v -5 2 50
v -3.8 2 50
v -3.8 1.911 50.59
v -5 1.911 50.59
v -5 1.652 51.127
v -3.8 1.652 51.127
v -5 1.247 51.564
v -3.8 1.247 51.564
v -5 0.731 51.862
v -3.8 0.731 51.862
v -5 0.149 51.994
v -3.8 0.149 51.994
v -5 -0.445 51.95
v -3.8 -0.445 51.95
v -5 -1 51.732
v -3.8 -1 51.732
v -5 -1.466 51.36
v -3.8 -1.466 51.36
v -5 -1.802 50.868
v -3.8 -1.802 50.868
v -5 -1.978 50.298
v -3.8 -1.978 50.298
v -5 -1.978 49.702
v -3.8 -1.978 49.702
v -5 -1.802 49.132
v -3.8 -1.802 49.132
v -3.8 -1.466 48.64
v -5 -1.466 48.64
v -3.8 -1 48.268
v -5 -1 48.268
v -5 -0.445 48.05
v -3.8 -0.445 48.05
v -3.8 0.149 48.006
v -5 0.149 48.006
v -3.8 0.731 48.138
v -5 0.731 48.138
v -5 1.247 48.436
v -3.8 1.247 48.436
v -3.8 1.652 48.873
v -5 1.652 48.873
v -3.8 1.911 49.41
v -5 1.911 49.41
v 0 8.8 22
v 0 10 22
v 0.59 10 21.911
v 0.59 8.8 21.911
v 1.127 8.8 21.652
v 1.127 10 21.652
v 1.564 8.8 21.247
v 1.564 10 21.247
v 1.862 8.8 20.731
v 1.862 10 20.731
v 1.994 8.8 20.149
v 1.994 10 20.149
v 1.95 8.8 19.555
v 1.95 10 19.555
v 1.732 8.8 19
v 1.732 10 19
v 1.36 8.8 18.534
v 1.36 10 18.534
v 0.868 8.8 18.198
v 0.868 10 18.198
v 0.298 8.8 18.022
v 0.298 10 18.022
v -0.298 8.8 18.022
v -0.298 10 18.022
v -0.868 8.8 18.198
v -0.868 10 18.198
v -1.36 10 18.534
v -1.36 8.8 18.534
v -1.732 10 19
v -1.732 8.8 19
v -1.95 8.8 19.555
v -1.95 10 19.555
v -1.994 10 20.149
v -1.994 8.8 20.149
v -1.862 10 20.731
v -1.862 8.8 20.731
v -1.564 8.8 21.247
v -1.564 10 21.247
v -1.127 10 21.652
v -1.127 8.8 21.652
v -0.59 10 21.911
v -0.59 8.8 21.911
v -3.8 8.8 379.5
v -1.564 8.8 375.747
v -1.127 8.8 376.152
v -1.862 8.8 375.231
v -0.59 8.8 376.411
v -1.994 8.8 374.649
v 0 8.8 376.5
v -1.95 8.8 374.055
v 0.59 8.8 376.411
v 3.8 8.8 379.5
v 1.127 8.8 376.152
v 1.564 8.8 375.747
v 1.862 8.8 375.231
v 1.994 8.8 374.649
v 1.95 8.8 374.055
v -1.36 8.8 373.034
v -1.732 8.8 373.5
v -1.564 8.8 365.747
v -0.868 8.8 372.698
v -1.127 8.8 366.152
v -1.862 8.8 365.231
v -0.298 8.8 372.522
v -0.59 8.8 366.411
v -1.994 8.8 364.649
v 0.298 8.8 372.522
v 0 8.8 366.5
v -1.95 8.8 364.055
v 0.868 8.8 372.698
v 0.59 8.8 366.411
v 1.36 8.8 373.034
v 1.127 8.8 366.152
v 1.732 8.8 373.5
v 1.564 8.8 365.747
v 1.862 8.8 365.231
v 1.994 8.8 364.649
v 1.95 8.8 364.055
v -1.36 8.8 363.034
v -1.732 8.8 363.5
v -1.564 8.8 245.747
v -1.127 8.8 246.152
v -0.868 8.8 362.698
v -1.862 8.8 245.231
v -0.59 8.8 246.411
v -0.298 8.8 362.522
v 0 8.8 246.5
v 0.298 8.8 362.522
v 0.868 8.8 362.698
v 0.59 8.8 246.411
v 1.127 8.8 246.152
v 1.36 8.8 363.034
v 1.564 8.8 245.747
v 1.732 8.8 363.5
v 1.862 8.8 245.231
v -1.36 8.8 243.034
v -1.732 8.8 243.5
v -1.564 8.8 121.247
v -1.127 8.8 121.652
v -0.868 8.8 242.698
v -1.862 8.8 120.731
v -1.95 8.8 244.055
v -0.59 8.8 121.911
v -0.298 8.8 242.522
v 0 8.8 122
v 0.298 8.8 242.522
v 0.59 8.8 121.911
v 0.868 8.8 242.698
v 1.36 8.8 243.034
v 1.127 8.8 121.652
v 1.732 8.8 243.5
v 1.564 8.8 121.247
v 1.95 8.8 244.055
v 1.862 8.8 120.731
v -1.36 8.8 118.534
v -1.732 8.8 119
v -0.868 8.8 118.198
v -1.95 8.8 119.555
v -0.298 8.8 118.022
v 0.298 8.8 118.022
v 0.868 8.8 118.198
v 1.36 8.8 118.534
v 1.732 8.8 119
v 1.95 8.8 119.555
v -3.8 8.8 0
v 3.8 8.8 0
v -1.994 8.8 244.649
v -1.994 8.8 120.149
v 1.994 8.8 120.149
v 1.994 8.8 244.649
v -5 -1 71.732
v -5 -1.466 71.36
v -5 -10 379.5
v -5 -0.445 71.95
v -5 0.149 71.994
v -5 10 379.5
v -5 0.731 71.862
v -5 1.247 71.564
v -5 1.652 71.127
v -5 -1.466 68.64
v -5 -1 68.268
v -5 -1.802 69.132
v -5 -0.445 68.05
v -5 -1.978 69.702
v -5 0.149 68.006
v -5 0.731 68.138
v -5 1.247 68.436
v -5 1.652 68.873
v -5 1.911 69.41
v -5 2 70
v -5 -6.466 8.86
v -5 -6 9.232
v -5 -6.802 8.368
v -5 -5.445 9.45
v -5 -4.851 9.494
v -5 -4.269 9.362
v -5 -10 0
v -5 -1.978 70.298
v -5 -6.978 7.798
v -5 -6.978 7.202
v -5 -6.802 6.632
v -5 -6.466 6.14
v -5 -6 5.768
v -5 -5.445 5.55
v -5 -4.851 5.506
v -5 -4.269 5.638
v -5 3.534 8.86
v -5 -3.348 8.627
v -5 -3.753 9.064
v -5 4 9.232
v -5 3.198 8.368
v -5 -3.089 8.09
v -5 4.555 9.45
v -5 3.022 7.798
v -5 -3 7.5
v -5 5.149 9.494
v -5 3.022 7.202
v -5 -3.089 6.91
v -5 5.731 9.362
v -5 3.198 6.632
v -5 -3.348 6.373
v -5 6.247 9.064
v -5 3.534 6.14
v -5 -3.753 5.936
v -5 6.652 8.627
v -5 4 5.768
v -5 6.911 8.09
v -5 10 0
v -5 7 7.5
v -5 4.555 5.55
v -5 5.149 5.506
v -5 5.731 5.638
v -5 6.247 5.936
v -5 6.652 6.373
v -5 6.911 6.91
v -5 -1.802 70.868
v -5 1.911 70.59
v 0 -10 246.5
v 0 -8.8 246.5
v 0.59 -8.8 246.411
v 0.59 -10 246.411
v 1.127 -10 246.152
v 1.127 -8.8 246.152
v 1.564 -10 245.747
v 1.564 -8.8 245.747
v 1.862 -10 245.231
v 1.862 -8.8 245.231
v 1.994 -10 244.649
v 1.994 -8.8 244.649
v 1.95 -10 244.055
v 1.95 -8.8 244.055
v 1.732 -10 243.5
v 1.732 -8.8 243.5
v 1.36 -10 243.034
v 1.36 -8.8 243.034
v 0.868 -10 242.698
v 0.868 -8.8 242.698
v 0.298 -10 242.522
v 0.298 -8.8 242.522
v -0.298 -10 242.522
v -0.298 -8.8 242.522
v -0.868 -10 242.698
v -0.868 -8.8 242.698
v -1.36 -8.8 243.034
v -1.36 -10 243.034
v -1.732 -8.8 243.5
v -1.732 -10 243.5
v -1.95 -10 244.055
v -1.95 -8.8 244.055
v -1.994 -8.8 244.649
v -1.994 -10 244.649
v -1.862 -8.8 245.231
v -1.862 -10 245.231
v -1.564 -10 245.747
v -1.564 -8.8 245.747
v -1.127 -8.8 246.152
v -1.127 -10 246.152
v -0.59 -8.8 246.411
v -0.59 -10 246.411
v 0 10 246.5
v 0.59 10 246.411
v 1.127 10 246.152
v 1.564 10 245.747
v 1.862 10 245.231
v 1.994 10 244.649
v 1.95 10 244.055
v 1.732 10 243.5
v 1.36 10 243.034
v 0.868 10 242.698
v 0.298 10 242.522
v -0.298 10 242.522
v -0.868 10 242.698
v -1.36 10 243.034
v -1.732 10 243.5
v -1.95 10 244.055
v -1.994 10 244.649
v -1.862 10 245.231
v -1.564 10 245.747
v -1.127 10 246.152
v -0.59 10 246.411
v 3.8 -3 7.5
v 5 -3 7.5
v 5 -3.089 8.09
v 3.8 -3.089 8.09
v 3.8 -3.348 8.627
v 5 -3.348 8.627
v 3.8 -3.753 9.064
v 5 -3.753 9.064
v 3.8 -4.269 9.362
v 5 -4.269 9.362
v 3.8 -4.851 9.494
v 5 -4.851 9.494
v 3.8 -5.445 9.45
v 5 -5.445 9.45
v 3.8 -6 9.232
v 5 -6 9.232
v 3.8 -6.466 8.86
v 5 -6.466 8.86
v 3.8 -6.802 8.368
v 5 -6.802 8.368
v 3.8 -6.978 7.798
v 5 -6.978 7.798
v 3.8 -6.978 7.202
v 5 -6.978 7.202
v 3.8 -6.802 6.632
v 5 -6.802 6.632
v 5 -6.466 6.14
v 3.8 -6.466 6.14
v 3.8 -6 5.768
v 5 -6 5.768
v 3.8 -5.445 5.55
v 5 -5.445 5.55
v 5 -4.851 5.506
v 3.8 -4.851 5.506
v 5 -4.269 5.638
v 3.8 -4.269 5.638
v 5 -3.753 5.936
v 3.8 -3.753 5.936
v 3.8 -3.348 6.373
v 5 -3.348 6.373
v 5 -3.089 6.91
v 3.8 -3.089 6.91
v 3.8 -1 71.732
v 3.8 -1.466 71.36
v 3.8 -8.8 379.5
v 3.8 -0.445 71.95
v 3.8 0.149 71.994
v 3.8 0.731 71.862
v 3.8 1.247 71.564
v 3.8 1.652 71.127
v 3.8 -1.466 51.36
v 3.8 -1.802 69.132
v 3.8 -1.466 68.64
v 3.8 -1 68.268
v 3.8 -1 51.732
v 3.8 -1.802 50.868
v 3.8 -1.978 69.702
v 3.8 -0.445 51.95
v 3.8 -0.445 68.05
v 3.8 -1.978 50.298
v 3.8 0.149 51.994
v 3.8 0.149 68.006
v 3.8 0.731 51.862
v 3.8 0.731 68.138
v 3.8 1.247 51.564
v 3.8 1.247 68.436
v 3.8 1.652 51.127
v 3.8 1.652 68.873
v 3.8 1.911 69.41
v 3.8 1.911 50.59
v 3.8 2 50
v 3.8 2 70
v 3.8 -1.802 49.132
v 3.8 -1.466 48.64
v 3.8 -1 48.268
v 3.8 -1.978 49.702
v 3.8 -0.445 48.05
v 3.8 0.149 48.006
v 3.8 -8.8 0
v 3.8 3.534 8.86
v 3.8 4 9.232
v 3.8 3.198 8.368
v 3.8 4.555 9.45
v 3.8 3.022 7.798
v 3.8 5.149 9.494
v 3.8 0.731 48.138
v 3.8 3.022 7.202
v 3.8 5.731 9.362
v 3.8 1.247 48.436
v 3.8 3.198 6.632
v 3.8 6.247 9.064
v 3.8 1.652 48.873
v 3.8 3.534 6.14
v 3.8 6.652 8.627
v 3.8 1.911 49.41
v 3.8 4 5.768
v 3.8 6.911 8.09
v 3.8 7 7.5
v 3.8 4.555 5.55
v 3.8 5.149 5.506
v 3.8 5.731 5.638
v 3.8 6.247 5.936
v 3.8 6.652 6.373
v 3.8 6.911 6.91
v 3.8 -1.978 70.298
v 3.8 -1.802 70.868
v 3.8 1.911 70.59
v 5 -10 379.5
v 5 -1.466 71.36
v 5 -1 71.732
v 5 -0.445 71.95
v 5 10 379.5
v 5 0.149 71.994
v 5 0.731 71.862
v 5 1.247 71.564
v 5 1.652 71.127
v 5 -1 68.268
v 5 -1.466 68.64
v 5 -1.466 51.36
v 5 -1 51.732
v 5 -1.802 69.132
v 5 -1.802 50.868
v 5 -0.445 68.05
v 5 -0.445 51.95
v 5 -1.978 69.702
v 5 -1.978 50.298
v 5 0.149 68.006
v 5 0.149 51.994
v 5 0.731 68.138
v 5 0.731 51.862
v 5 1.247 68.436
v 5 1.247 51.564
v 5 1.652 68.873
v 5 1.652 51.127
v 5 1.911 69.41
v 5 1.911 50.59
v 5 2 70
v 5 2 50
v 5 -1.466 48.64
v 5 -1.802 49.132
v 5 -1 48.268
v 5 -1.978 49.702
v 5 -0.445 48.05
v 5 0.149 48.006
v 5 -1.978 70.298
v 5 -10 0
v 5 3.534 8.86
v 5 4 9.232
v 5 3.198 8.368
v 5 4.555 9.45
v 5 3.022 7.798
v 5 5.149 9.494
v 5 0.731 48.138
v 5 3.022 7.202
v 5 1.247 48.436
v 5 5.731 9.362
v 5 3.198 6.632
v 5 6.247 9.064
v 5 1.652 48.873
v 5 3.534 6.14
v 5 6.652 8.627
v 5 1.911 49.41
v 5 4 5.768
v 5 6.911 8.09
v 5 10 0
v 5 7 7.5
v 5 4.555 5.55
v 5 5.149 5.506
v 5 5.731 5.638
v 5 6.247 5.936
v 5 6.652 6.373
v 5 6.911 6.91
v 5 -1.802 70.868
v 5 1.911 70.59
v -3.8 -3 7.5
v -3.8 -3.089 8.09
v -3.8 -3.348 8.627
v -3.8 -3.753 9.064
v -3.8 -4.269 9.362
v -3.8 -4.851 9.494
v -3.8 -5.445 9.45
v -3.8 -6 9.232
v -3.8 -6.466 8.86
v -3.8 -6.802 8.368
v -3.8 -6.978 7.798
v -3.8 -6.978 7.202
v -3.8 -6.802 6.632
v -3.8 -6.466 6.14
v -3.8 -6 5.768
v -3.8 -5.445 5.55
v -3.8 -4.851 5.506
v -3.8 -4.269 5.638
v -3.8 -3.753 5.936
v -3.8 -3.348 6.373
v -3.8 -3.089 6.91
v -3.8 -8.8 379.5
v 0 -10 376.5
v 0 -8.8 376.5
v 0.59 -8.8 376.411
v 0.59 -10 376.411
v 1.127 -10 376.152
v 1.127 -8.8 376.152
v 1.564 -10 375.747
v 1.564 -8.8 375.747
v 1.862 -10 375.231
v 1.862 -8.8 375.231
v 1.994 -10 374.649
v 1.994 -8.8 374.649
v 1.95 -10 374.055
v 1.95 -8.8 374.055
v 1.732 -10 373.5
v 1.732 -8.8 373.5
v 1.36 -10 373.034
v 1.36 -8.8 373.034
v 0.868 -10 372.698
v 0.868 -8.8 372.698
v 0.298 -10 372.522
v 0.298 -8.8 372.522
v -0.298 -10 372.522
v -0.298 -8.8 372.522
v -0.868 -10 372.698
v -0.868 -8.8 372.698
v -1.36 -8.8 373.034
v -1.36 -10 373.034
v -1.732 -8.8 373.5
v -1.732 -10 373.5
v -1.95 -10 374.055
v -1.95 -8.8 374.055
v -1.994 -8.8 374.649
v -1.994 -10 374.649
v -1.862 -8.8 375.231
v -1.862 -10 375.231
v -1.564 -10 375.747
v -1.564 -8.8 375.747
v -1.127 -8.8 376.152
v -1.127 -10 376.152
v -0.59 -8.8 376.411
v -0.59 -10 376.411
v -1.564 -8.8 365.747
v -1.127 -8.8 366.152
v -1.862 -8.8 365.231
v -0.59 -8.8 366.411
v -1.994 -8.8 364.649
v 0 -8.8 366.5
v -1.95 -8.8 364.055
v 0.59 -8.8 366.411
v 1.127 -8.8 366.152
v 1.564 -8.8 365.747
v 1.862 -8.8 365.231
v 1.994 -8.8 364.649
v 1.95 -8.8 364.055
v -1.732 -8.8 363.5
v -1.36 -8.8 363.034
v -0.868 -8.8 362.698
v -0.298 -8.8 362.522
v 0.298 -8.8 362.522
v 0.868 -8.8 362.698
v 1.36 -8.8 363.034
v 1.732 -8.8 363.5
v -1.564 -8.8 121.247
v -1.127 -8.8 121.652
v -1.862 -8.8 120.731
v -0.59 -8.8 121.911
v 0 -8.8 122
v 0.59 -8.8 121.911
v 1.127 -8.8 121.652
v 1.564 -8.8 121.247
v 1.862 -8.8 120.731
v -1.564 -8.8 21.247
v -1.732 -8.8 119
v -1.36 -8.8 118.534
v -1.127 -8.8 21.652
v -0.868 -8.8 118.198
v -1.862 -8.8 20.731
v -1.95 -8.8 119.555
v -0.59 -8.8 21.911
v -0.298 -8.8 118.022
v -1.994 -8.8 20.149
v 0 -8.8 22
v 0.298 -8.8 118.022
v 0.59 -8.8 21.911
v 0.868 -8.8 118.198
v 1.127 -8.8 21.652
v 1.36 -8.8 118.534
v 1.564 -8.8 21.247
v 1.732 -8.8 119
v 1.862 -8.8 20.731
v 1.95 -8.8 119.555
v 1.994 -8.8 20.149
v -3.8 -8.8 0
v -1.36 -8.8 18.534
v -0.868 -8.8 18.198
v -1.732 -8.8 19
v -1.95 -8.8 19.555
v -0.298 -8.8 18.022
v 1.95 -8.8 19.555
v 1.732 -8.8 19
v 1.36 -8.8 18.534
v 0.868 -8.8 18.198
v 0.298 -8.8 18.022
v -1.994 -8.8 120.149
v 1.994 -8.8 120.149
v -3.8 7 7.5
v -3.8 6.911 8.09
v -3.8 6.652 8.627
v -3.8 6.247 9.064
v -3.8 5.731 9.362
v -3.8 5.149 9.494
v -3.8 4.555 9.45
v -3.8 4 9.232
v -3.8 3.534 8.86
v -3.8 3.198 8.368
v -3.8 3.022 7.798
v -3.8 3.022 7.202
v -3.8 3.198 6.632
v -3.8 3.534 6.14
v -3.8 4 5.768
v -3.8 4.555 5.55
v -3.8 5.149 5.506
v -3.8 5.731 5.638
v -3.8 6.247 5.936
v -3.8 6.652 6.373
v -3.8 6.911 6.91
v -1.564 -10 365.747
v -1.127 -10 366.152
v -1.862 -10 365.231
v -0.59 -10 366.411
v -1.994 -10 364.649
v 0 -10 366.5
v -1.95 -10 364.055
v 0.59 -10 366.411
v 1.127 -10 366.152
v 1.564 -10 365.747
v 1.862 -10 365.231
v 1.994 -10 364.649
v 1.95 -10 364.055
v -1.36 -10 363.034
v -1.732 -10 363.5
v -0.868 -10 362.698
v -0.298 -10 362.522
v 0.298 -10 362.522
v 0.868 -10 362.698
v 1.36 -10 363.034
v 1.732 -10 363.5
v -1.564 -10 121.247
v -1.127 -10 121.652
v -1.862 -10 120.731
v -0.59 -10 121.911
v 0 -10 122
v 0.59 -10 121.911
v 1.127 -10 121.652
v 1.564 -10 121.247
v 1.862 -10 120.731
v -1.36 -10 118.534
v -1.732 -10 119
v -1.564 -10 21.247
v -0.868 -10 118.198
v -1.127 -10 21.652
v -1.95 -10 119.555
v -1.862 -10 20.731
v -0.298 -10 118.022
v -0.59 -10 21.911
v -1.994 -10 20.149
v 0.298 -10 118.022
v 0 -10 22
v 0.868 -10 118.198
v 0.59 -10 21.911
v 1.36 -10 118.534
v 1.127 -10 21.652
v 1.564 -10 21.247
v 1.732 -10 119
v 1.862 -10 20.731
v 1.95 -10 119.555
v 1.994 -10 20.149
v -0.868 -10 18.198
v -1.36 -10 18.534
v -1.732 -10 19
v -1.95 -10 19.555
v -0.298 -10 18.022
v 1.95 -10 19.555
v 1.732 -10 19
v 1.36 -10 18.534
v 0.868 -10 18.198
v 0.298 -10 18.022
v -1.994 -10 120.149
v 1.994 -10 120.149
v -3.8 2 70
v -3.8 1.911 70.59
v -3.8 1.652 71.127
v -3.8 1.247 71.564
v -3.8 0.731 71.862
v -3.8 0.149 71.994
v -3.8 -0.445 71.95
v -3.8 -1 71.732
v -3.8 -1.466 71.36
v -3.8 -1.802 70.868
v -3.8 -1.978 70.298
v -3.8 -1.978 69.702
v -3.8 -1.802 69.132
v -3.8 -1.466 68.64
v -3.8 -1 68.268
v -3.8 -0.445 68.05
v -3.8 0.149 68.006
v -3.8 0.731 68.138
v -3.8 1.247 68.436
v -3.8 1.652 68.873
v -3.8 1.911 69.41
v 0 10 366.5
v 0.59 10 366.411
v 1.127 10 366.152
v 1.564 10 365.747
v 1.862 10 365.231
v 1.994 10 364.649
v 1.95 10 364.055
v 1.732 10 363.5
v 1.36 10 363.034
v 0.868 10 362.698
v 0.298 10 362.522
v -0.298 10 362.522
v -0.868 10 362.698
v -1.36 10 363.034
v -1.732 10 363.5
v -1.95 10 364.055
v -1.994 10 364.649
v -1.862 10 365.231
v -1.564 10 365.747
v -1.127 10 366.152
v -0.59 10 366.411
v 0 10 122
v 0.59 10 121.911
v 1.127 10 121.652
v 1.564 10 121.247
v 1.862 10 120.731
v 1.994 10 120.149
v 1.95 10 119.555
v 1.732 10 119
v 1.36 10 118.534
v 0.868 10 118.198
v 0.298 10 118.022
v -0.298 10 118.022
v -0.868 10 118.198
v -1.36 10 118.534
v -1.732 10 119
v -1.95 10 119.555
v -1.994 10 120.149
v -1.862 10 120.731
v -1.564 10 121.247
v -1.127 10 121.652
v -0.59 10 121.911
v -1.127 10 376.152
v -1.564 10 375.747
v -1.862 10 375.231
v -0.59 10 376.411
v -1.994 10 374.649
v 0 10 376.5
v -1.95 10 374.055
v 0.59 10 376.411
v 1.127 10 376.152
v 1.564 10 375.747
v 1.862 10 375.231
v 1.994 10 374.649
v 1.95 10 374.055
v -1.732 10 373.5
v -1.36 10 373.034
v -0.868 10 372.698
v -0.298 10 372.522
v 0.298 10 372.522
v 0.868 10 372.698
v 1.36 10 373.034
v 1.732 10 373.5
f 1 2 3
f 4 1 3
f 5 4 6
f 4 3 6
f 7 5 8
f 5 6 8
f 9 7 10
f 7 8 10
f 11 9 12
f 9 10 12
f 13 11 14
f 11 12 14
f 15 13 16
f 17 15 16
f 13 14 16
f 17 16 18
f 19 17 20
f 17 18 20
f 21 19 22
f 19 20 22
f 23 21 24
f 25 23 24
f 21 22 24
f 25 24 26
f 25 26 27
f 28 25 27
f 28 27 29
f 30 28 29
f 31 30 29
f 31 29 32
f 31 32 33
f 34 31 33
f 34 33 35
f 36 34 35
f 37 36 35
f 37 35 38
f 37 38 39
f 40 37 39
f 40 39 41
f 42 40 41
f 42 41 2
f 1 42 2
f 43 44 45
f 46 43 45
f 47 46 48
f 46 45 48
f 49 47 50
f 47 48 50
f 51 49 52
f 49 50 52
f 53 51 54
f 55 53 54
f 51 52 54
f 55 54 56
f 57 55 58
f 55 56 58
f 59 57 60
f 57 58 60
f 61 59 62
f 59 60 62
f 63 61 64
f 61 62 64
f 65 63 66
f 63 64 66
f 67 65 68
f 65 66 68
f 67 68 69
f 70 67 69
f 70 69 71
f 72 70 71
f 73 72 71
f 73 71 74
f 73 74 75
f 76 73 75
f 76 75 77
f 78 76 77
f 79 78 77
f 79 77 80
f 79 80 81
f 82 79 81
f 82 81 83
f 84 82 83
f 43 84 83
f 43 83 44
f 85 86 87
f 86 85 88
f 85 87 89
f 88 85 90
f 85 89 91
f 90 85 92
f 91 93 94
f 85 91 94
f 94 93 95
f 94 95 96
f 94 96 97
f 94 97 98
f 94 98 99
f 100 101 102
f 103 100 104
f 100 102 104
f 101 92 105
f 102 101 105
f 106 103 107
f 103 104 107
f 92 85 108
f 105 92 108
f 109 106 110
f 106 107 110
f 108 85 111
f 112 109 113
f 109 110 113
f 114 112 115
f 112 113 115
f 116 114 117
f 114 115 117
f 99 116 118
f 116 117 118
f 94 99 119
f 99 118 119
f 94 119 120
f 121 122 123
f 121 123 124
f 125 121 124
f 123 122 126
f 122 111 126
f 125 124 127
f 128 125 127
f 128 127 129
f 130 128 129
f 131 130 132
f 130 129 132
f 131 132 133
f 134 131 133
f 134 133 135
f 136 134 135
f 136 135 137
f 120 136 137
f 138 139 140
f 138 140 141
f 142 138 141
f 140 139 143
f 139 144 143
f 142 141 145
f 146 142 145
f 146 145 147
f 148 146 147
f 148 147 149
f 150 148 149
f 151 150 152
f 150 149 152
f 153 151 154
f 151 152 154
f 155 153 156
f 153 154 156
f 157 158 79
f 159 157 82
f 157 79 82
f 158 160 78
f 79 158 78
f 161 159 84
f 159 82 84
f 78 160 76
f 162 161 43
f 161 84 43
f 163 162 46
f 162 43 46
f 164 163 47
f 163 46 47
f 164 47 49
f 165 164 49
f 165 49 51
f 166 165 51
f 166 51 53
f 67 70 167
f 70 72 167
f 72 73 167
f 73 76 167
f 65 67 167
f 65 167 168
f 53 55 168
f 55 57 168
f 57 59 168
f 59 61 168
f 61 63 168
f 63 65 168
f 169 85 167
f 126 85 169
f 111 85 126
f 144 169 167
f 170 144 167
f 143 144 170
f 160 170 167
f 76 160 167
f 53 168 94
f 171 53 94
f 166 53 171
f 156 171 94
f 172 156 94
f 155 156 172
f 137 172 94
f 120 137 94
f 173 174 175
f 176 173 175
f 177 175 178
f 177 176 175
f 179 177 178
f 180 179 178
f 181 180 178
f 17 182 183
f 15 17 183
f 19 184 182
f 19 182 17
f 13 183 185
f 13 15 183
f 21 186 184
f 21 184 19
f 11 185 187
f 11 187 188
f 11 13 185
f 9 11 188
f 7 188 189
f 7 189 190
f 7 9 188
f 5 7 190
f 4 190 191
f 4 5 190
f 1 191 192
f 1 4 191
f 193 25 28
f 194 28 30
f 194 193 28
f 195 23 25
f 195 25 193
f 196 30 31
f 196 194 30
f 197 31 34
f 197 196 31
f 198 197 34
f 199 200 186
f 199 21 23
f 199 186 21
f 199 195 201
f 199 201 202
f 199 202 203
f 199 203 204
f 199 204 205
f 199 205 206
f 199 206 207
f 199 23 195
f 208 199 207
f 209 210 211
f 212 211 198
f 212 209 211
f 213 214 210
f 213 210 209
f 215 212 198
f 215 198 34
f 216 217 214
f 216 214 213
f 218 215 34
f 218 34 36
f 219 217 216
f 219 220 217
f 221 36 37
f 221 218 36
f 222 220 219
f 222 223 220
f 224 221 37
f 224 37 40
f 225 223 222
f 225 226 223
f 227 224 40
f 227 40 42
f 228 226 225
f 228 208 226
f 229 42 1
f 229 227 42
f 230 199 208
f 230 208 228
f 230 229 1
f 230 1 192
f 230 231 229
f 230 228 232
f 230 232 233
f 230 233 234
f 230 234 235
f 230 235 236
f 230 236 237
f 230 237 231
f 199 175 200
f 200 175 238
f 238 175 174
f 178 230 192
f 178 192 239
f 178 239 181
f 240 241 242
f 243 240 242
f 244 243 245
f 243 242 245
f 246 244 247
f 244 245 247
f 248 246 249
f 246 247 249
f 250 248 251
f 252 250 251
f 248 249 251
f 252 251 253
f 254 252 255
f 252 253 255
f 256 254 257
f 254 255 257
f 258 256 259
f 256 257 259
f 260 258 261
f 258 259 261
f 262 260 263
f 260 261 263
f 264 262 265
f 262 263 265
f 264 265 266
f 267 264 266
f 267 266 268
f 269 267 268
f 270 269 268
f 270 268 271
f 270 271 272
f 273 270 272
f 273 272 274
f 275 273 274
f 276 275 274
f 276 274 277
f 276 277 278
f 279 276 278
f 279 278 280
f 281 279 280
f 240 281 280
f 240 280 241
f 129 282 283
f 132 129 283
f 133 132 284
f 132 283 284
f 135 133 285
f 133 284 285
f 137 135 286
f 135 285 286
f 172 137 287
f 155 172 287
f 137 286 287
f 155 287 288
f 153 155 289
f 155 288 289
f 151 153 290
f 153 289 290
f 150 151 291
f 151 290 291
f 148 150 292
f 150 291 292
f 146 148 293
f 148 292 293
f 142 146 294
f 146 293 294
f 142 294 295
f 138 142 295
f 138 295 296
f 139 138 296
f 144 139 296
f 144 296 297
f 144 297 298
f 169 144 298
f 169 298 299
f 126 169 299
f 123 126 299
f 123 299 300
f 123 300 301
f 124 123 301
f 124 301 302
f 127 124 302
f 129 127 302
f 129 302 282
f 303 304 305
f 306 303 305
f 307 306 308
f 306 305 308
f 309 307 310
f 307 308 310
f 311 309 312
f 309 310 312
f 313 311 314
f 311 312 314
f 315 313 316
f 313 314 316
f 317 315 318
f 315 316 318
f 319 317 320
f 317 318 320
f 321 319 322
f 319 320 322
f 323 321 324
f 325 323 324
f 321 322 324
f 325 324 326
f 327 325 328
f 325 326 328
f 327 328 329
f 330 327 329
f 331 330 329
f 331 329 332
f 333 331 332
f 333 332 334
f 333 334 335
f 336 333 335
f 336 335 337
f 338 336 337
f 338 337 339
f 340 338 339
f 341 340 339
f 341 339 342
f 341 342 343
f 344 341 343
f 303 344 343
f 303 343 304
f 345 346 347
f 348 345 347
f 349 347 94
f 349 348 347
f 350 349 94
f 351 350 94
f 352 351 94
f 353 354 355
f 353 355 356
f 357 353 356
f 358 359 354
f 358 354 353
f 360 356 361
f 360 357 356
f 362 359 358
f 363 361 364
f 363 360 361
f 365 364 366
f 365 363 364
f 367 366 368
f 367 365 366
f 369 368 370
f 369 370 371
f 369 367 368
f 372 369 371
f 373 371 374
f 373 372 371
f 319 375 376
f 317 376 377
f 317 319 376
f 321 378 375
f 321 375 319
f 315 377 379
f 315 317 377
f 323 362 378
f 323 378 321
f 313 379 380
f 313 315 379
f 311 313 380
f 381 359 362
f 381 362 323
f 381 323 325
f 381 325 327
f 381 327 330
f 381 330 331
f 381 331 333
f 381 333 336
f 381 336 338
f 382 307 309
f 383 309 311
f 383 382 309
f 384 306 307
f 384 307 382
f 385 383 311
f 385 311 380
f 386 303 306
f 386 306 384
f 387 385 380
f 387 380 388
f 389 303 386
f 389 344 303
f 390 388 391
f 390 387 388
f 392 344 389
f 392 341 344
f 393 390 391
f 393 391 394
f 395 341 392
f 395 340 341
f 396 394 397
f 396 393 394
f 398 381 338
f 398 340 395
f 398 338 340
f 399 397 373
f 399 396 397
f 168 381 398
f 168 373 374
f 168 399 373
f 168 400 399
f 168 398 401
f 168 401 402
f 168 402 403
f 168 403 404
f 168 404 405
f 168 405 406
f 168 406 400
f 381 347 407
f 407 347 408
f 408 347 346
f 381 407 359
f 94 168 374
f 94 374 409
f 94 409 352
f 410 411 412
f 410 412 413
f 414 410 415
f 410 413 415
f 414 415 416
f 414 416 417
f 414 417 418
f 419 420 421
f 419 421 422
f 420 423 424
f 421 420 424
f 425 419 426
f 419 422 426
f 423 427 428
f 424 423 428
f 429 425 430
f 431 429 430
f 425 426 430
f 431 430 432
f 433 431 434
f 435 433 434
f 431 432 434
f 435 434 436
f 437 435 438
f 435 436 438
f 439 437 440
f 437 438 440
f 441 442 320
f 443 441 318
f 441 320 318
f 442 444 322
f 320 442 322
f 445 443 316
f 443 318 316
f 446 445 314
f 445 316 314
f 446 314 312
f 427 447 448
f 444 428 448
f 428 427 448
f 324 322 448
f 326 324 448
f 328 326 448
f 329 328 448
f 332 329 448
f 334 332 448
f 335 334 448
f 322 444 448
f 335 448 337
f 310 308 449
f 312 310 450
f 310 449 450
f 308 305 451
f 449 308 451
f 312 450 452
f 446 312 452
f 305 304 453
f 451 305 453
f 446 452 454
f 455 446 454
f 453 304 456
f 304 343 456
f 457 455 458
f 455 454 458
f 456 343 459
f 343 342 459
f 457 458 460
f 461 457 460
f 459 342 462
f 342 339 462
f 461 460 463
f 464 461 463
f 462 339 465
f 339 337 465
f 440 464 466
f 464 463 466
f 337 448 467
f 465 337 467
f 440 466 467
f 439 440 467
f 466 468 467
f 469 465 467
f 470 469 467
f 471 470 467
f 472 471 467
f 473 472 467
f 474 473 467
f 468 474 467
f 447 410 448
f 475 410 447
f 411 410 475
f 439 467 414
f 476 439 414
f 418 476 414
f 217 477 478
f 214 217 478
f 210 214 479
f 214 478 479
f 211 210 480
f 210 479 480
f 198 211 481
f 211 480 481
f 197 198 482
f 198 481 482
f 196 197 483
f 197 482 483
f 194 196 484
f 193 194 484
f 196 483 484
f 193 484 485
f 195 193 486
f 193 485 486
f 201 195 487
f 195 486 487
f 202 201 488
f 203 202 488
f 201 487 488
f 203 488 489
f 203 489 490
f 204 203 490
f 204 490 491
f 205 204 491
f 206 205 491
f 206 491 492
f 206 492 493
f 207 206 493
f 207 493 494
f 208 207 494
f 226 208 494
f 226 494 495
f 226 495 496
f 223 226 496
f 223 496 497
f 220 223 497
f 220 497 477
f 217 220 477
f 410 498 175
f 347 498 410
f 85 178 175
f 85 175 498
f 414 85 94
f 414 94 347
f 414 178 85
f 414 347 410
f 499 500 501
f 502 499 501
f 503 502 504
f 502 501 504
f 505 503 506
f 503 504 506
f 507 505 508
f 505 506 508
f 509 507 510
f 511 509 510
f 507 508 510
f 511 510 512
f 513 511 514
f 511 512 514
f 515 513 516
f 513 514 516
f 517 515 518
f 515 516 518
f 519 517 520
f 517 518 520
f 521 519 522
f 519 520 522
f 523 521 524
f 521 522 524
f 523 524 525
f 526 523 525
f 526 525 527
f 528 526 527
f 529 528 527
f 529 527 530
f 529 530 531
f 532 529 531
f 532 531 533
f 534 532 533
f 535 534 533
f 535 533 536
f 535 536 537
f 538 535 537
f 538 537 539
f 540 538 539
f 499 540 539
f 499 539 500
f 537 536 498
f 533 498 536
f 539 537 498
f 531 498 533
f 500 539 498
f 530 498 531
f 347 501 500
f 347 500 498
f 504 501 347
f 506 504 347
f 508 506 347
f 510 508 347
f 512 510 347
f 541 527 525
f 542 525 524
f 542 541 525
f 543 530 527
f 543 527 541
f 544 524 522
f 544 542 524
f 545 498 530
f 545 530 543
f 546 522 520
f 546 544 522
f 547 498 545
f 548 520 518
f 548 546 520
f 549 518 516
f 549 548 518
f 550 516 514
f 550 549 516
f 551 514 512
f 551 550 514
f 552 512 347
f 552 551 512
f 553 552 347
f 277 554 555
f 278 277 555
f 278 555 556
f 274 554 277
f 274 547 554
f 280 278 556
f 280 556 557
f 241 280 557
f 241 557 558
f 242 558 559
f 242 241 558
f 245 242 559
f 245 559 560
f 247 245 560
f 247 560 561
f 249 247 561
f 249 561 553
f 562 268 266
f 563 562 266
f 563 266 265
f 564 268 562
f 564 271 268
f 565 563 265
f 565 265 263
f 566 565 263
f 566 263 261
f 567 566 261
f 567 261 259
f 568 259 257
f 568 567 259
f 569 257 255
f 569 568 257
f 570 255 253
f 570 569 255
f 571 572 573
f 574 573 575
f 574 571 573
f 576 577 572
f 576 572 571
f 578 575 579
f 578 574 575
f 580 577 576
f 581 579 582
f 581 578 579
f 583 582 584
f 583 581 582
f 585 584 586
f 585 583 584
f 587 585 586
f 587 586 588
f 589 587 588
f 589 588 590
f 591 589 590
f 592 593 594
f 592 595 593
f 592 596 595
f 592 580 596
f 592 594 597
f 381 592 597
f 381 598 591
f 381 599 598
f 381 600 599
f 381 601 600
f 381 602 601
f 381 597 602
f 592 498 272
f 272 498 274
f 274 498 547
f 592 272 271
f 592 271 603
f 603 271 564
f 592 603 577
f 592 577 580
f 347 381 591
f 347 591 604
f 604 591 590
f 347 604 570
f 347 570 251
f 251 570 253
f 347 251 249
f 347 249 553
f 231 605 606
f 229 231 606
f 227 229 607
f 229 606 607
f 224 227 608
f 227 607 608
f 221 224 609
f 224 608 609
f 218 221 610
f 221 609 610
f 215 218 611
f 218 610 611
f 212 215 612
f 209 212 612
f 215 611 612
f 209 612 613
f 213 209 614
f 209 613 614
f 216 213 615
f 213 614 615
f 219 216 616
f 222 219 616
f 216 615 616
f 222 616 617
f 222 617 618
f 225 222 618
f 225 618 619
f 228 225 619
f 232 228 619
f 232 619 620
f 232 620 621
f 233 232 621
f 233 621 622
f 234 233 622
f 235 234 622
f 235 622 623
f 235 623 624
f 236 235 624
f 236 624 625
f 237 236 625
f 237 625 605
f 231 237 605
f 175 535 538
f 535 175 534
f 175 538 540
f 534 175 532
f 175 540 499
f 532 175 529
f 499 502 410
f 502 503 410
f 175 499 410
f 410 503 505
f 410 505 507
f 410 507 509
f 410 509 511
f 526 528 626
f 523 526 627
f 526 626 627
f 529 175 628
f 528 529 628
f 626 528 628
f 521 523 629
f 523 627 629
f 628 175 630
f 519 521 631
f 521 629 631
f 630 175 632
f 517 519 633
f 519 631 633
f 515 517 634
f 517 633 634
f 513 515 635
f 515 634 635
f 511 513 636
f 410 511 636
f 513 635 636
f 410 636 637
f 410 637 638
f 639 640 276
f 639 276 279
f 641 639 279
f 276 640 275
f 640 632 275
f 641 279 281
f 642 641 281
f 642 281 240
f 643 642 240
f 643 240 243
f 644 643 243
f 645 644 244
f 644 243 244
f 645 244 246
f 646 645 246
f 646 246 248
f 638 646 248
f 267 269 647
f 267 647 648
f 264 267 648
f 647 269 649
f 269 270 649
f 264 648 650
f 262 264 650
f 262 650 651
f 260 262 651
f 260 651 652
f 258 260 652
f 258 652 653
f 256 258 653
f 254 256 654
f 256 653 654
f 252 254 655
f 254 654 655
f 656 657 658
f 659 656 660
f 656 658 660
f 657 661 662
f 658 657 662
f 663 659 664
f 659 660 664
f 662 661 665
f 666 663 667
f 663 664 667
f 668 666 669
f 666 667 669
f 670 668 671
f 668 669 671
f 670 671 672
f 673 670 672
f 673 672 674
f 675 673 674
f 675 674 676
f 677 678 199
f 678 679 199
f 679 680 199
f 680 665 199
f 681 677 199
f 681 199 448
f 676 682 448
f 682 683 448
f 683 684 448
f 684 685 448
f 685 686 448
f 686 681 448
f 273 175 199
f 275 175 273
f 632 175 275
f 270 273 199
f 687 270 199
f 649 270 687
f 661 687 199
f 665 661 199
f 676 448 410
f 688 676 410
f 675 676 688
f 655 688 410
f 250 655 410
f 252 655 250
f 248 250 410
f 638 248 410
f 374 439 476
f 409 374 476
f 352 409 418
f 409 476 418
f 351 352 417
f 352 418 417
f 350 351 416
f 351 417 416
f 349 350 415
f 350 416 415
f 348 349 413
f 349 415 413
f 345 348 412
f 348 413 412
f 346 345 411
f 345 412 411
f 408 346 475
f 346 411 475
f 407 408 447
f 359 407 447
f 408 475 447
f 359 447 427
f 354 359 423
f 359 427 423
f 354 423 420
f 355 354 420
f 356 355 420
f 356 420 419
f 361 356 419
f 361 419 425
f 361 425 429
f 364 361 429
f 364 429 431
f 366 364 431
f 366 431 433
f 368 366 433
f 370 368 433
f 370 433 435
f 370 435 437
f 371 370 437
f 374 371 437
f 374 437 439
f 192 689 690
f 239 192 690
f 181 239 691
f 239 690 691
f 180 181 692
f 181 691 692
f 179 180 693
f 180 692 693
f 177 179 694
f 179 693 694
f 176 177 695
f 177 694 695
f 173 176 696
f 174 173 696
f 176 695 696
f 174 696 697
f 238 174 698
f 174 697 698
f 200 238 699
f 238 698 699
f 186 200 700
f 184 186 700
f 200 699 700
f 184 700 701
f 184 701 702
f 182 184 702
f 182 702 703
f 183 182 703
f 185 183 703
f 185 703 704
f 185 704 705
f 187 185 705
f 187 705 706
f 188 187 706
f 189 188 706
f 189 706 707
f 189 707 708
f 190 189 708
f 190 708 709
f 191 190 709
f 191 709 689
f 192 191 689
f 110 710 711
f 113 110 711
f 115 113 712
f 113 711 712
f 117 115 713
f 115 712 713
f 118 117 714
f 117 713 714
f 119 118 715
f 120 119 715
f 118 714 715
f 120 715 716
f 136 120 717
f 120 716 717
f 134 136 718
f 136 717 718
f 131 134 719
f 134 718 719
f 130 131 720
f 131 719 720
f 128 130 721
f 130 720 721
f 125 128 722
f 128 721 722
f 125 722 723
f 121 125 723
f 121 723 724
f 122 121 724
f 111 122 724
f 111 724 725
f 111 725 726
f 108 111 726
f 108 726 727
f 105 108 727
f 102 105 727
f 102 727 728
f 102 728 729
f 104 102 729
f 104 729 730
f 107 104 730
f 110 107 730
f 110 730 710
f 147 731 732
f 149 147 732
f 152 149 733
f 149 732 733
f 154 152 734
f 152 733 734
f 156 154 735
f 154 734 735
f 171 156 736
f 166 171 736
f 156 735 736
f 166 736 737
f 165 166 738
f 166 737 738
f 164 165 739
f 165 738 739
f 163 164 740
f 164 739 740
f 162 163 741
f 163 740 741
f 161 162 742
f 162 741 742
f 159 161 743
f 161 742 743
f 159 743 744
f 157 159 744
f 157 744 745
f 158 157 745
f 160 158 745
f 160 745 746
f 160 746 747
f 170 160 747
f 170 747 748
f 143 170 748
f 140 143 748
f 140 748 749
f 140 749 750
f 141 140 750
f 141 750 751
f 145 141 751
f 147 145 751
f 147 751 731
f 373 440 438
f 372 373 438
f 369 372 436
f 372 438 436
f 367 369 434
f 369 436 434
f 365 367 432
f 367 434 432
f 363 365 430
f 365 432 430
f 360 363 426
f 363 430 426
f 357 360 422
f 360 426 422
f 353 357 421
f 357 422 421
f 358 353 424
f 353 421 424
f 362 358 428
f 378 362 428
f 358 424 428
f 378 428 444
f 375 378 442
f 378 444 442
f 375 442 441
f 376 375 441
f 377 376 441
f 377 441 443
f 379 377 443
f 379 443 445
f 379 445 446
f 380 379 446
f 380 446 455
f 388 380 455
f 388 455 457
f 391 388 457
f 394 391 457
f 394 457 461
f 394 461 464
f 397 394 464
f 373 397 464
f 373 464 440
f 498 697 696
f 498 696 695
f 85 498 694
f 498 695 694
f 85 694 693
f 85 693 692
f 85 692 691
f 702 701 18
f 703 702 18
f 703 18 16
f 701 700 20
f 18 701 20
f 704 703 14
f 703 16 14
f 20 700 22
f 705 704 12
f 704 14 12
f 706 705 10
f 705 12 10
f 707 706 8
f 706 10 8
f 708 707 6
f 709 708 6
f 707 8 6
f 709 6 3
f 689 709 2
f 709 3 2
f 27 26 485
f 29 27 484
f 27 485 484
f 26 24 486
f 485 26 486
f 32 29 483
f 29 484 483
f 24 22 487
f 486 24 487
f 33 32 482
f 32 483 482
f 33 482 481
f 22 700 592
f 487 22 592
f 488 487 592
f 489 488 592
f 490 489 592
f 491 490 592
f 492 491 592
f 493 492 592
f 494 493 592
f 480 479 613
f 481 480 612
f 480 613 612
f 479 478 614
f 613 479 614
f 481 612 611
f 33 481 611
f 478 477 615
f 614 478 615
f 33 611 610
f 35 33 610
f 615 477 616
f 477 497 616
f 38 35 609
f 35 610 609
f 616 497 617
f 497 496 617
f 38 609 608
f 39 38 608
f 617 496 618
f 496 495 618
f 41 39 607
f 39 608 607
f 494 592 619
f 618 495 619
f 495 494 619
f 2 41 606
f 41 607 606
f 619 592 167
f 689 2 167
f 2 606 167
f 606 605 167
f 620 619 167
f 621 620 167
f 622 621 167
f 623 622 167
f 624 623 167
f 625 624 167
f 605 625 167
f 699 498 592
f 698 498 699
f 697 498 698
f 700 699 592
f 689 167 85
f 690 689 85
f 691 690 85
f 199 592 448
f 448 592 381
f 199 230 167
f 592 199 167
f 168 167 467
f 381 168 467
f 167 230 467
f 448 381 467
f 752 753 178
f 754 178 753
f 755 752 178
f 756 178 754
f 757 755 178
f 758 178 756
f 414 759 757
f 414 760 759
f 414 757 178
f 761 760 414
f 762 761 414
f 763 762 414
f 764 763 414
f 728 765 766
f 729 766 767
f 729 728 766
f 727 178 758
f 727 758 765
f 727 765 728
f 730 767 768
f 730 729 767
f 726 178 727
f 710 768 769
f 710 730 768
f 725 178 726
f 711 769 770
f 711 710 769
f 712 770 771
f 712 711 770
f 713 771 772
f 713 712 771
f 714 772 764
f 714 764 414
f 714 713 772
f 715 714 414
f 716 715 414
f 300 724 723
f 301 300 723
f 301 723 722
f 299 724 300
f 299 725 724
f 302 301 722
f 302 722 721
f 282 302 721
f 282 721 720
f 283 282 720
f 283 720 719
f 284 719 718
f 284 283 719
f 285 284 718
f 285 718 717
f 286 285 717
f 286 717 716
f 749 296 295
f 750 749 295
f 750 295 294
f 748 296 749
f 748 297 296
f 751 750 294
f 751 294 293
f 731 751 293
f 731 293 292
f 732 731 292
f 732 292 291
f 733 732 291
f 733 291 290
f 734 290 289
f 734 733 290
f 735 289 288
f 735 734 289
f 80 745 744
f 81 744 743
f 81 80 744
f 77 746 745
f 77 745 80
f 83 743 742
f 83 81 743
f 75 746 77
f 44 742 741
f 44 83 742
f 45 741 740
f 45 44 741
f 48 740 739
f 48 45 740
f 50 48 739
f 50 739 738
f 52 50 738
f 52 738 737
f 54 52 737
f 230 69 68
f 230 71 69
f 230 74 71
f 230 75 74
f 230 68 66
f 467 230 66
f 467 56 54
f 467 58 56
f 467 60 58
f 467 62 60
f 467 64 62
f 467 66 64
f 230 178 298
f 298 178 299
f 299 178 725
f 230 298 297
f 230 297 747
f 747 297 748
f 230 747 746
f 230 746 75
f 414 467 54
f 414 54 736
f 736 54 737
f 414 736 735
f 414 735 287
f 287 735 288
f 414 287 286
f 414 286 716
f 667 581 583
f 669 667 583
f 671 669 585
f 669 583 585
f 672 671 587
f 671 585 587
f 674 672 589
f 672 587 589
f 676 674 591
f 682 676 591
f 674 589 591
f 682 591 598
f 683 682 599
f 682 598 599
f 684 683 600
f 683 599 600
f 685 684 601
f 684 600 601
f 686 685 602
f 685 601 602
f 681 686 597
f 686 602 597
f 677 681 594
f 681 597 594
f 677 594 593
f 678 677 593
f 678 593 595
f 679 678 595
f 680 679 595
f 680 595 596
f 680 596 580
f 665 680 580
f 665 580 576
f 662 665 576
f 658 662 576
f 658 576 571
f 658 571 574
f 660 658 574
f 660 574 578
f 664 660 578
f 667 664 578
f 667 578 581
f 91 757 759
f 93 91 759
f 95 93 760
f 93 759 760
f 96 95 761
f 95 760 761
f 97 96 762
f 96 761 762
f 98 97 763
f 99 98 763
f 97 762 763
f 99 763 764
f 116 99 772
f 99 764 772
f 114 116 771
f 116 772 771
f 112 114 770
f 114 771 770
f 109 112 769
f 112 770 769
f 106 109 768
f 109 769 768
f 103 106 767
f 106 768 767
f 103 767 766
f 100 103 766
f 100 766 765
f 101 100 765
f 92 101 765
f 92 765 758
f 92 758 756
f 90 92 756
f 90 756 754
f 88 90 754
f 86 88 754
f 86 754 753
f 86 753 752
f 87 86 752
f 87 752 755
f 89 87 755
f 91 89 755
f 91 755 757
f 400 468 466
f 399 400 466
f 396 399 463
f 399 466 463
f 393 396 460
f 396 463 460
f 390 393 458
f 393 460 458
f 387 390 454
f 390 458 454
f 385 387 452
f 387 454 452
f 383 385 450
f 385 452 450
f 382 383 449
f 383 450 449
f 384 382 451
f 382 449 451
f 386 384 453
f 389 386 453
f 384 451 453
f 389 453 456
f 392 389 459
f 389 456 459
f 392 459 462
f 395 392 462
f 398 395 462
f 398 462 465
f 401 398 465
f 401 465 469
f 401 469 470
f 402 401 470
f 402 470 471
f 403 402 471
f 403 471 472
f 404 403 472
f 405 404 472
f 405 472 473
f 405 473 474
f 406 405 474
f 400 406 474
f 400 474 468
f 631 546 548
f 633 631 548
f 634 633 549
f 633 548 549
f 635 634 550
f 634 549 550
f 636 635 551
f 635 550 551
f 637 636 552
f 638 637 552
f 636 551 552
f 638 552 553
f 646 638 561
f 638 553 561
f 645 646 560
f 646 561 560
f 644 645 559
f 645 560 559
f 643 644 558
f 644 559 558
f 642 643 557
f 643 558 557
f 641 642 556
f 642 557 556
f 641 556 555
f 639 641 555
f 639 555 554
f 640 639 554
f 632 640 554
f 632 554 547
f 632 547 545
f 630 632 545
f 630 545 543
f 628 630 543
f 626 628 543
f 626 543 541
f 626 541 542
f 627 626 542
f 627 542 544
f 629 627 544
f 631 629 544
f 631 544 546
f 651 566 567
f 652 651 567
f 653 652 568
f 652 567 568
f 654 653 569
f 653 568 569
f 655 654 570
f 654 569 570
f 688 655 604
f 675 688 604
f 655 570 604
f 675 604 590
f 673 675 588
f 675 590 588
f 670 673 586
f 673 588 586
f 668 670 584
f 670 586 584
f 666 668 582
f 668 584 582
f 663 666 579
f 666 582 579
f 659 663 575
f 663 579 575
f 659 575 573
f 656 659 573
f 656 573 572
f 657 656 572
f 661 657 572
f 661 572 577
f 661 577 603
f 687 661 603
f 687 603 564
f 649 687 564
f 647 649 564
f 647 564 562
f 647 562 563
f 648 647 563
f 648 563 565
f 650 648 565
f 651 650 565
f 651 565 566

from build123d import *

# Parameters (mm, degrees)
SKETCH_1_W          = 10
SKETCH_1_H          = 20
SKETCH_1_W_2        = 7.6
SKETCH_1_H_2        = 17.6
EXTRUDE_1_DEPTH     = 379.5
SKETCH_2_R          = 2
CUT_EXTRUDE_1_DEPTH = 381.05953481
SKETCH_3_R          = 2
CUT_EXTRUDE_2_DEPTH = 380.763413193


with BuildPart() as part:
    # ｽｹｯﾁ1 → 押し出し-薄板1 (new body)
    with BuildSketch(Plane.XY):
        Rectangle(SKETCH_1_W, SKETCH_1_H)
        Rectangle(SKETCH_1_W_2, SKETCH_1_H_2, mode=Mode.SUBTRACT)
    extrude(amount=EXTRUDE_1_DEPTH)

    # ｽｹｯﾁ2 → ｶｯﾄ - 押し出し1 (cut, through all)
    with BuildSketch(Plane(origin=(0, 10, 0), x_dir=(1, 0, 0), z_dir=(0, 1, 0))):
        with Locations(Location((0, -364.5, 0), (0, 0, 270))):
            Circle(SKETCH_2_R)
        with Locations(Location((0, -374.5, 0), (0, 0, 270))):
            Circle(SKETCH_2_R)
        with Locations(Location((0, -244.5, 0), (0, 0, 270))):
            Circle(SKETCH_2_R)
        with Locations(Location((0, -120, 0), (0, 0, 270))):
            Circle(SKETCH_2_R)
        with Locations(Location((0, -20, 0), (0, 0, 270))):
            Circle(SKETCH_2_R)
    extrude(amount=-CUT_EXTRUDE_1_DEPTH, mode=Mode.SUBTRACT)

    # ｽｹｯﾁ3 → ｶｯﾄ - 押し出し2 (cut, through all)
    with BuildSketch(Plane(origin=(5, 0, 0), x_dir=(0, 0, -1), z_dir=(1, 0, 0))):
        with Locations(Location((-7.5, 5, 0), (0, 0, 90))):
            Circle(SKETCH_3_R)
        with Locations(Location((-7.5, -5, 0), (0, 0, 90))):
            Circle(SKETCH_3_R)
        with Locations(Location((-70, 0, 0), (0, 0, 90))):
            Circle(SKETCH_3_R)
        with Locations(Location((-50, 0, 0), (0, 0, 90))):
            Circle(SKETCH_3_R)
    extrude(amount=-CUT_EXTRUDE_2_DEPTH, mode=Mode.SUBTRACT)


solid = part.part
